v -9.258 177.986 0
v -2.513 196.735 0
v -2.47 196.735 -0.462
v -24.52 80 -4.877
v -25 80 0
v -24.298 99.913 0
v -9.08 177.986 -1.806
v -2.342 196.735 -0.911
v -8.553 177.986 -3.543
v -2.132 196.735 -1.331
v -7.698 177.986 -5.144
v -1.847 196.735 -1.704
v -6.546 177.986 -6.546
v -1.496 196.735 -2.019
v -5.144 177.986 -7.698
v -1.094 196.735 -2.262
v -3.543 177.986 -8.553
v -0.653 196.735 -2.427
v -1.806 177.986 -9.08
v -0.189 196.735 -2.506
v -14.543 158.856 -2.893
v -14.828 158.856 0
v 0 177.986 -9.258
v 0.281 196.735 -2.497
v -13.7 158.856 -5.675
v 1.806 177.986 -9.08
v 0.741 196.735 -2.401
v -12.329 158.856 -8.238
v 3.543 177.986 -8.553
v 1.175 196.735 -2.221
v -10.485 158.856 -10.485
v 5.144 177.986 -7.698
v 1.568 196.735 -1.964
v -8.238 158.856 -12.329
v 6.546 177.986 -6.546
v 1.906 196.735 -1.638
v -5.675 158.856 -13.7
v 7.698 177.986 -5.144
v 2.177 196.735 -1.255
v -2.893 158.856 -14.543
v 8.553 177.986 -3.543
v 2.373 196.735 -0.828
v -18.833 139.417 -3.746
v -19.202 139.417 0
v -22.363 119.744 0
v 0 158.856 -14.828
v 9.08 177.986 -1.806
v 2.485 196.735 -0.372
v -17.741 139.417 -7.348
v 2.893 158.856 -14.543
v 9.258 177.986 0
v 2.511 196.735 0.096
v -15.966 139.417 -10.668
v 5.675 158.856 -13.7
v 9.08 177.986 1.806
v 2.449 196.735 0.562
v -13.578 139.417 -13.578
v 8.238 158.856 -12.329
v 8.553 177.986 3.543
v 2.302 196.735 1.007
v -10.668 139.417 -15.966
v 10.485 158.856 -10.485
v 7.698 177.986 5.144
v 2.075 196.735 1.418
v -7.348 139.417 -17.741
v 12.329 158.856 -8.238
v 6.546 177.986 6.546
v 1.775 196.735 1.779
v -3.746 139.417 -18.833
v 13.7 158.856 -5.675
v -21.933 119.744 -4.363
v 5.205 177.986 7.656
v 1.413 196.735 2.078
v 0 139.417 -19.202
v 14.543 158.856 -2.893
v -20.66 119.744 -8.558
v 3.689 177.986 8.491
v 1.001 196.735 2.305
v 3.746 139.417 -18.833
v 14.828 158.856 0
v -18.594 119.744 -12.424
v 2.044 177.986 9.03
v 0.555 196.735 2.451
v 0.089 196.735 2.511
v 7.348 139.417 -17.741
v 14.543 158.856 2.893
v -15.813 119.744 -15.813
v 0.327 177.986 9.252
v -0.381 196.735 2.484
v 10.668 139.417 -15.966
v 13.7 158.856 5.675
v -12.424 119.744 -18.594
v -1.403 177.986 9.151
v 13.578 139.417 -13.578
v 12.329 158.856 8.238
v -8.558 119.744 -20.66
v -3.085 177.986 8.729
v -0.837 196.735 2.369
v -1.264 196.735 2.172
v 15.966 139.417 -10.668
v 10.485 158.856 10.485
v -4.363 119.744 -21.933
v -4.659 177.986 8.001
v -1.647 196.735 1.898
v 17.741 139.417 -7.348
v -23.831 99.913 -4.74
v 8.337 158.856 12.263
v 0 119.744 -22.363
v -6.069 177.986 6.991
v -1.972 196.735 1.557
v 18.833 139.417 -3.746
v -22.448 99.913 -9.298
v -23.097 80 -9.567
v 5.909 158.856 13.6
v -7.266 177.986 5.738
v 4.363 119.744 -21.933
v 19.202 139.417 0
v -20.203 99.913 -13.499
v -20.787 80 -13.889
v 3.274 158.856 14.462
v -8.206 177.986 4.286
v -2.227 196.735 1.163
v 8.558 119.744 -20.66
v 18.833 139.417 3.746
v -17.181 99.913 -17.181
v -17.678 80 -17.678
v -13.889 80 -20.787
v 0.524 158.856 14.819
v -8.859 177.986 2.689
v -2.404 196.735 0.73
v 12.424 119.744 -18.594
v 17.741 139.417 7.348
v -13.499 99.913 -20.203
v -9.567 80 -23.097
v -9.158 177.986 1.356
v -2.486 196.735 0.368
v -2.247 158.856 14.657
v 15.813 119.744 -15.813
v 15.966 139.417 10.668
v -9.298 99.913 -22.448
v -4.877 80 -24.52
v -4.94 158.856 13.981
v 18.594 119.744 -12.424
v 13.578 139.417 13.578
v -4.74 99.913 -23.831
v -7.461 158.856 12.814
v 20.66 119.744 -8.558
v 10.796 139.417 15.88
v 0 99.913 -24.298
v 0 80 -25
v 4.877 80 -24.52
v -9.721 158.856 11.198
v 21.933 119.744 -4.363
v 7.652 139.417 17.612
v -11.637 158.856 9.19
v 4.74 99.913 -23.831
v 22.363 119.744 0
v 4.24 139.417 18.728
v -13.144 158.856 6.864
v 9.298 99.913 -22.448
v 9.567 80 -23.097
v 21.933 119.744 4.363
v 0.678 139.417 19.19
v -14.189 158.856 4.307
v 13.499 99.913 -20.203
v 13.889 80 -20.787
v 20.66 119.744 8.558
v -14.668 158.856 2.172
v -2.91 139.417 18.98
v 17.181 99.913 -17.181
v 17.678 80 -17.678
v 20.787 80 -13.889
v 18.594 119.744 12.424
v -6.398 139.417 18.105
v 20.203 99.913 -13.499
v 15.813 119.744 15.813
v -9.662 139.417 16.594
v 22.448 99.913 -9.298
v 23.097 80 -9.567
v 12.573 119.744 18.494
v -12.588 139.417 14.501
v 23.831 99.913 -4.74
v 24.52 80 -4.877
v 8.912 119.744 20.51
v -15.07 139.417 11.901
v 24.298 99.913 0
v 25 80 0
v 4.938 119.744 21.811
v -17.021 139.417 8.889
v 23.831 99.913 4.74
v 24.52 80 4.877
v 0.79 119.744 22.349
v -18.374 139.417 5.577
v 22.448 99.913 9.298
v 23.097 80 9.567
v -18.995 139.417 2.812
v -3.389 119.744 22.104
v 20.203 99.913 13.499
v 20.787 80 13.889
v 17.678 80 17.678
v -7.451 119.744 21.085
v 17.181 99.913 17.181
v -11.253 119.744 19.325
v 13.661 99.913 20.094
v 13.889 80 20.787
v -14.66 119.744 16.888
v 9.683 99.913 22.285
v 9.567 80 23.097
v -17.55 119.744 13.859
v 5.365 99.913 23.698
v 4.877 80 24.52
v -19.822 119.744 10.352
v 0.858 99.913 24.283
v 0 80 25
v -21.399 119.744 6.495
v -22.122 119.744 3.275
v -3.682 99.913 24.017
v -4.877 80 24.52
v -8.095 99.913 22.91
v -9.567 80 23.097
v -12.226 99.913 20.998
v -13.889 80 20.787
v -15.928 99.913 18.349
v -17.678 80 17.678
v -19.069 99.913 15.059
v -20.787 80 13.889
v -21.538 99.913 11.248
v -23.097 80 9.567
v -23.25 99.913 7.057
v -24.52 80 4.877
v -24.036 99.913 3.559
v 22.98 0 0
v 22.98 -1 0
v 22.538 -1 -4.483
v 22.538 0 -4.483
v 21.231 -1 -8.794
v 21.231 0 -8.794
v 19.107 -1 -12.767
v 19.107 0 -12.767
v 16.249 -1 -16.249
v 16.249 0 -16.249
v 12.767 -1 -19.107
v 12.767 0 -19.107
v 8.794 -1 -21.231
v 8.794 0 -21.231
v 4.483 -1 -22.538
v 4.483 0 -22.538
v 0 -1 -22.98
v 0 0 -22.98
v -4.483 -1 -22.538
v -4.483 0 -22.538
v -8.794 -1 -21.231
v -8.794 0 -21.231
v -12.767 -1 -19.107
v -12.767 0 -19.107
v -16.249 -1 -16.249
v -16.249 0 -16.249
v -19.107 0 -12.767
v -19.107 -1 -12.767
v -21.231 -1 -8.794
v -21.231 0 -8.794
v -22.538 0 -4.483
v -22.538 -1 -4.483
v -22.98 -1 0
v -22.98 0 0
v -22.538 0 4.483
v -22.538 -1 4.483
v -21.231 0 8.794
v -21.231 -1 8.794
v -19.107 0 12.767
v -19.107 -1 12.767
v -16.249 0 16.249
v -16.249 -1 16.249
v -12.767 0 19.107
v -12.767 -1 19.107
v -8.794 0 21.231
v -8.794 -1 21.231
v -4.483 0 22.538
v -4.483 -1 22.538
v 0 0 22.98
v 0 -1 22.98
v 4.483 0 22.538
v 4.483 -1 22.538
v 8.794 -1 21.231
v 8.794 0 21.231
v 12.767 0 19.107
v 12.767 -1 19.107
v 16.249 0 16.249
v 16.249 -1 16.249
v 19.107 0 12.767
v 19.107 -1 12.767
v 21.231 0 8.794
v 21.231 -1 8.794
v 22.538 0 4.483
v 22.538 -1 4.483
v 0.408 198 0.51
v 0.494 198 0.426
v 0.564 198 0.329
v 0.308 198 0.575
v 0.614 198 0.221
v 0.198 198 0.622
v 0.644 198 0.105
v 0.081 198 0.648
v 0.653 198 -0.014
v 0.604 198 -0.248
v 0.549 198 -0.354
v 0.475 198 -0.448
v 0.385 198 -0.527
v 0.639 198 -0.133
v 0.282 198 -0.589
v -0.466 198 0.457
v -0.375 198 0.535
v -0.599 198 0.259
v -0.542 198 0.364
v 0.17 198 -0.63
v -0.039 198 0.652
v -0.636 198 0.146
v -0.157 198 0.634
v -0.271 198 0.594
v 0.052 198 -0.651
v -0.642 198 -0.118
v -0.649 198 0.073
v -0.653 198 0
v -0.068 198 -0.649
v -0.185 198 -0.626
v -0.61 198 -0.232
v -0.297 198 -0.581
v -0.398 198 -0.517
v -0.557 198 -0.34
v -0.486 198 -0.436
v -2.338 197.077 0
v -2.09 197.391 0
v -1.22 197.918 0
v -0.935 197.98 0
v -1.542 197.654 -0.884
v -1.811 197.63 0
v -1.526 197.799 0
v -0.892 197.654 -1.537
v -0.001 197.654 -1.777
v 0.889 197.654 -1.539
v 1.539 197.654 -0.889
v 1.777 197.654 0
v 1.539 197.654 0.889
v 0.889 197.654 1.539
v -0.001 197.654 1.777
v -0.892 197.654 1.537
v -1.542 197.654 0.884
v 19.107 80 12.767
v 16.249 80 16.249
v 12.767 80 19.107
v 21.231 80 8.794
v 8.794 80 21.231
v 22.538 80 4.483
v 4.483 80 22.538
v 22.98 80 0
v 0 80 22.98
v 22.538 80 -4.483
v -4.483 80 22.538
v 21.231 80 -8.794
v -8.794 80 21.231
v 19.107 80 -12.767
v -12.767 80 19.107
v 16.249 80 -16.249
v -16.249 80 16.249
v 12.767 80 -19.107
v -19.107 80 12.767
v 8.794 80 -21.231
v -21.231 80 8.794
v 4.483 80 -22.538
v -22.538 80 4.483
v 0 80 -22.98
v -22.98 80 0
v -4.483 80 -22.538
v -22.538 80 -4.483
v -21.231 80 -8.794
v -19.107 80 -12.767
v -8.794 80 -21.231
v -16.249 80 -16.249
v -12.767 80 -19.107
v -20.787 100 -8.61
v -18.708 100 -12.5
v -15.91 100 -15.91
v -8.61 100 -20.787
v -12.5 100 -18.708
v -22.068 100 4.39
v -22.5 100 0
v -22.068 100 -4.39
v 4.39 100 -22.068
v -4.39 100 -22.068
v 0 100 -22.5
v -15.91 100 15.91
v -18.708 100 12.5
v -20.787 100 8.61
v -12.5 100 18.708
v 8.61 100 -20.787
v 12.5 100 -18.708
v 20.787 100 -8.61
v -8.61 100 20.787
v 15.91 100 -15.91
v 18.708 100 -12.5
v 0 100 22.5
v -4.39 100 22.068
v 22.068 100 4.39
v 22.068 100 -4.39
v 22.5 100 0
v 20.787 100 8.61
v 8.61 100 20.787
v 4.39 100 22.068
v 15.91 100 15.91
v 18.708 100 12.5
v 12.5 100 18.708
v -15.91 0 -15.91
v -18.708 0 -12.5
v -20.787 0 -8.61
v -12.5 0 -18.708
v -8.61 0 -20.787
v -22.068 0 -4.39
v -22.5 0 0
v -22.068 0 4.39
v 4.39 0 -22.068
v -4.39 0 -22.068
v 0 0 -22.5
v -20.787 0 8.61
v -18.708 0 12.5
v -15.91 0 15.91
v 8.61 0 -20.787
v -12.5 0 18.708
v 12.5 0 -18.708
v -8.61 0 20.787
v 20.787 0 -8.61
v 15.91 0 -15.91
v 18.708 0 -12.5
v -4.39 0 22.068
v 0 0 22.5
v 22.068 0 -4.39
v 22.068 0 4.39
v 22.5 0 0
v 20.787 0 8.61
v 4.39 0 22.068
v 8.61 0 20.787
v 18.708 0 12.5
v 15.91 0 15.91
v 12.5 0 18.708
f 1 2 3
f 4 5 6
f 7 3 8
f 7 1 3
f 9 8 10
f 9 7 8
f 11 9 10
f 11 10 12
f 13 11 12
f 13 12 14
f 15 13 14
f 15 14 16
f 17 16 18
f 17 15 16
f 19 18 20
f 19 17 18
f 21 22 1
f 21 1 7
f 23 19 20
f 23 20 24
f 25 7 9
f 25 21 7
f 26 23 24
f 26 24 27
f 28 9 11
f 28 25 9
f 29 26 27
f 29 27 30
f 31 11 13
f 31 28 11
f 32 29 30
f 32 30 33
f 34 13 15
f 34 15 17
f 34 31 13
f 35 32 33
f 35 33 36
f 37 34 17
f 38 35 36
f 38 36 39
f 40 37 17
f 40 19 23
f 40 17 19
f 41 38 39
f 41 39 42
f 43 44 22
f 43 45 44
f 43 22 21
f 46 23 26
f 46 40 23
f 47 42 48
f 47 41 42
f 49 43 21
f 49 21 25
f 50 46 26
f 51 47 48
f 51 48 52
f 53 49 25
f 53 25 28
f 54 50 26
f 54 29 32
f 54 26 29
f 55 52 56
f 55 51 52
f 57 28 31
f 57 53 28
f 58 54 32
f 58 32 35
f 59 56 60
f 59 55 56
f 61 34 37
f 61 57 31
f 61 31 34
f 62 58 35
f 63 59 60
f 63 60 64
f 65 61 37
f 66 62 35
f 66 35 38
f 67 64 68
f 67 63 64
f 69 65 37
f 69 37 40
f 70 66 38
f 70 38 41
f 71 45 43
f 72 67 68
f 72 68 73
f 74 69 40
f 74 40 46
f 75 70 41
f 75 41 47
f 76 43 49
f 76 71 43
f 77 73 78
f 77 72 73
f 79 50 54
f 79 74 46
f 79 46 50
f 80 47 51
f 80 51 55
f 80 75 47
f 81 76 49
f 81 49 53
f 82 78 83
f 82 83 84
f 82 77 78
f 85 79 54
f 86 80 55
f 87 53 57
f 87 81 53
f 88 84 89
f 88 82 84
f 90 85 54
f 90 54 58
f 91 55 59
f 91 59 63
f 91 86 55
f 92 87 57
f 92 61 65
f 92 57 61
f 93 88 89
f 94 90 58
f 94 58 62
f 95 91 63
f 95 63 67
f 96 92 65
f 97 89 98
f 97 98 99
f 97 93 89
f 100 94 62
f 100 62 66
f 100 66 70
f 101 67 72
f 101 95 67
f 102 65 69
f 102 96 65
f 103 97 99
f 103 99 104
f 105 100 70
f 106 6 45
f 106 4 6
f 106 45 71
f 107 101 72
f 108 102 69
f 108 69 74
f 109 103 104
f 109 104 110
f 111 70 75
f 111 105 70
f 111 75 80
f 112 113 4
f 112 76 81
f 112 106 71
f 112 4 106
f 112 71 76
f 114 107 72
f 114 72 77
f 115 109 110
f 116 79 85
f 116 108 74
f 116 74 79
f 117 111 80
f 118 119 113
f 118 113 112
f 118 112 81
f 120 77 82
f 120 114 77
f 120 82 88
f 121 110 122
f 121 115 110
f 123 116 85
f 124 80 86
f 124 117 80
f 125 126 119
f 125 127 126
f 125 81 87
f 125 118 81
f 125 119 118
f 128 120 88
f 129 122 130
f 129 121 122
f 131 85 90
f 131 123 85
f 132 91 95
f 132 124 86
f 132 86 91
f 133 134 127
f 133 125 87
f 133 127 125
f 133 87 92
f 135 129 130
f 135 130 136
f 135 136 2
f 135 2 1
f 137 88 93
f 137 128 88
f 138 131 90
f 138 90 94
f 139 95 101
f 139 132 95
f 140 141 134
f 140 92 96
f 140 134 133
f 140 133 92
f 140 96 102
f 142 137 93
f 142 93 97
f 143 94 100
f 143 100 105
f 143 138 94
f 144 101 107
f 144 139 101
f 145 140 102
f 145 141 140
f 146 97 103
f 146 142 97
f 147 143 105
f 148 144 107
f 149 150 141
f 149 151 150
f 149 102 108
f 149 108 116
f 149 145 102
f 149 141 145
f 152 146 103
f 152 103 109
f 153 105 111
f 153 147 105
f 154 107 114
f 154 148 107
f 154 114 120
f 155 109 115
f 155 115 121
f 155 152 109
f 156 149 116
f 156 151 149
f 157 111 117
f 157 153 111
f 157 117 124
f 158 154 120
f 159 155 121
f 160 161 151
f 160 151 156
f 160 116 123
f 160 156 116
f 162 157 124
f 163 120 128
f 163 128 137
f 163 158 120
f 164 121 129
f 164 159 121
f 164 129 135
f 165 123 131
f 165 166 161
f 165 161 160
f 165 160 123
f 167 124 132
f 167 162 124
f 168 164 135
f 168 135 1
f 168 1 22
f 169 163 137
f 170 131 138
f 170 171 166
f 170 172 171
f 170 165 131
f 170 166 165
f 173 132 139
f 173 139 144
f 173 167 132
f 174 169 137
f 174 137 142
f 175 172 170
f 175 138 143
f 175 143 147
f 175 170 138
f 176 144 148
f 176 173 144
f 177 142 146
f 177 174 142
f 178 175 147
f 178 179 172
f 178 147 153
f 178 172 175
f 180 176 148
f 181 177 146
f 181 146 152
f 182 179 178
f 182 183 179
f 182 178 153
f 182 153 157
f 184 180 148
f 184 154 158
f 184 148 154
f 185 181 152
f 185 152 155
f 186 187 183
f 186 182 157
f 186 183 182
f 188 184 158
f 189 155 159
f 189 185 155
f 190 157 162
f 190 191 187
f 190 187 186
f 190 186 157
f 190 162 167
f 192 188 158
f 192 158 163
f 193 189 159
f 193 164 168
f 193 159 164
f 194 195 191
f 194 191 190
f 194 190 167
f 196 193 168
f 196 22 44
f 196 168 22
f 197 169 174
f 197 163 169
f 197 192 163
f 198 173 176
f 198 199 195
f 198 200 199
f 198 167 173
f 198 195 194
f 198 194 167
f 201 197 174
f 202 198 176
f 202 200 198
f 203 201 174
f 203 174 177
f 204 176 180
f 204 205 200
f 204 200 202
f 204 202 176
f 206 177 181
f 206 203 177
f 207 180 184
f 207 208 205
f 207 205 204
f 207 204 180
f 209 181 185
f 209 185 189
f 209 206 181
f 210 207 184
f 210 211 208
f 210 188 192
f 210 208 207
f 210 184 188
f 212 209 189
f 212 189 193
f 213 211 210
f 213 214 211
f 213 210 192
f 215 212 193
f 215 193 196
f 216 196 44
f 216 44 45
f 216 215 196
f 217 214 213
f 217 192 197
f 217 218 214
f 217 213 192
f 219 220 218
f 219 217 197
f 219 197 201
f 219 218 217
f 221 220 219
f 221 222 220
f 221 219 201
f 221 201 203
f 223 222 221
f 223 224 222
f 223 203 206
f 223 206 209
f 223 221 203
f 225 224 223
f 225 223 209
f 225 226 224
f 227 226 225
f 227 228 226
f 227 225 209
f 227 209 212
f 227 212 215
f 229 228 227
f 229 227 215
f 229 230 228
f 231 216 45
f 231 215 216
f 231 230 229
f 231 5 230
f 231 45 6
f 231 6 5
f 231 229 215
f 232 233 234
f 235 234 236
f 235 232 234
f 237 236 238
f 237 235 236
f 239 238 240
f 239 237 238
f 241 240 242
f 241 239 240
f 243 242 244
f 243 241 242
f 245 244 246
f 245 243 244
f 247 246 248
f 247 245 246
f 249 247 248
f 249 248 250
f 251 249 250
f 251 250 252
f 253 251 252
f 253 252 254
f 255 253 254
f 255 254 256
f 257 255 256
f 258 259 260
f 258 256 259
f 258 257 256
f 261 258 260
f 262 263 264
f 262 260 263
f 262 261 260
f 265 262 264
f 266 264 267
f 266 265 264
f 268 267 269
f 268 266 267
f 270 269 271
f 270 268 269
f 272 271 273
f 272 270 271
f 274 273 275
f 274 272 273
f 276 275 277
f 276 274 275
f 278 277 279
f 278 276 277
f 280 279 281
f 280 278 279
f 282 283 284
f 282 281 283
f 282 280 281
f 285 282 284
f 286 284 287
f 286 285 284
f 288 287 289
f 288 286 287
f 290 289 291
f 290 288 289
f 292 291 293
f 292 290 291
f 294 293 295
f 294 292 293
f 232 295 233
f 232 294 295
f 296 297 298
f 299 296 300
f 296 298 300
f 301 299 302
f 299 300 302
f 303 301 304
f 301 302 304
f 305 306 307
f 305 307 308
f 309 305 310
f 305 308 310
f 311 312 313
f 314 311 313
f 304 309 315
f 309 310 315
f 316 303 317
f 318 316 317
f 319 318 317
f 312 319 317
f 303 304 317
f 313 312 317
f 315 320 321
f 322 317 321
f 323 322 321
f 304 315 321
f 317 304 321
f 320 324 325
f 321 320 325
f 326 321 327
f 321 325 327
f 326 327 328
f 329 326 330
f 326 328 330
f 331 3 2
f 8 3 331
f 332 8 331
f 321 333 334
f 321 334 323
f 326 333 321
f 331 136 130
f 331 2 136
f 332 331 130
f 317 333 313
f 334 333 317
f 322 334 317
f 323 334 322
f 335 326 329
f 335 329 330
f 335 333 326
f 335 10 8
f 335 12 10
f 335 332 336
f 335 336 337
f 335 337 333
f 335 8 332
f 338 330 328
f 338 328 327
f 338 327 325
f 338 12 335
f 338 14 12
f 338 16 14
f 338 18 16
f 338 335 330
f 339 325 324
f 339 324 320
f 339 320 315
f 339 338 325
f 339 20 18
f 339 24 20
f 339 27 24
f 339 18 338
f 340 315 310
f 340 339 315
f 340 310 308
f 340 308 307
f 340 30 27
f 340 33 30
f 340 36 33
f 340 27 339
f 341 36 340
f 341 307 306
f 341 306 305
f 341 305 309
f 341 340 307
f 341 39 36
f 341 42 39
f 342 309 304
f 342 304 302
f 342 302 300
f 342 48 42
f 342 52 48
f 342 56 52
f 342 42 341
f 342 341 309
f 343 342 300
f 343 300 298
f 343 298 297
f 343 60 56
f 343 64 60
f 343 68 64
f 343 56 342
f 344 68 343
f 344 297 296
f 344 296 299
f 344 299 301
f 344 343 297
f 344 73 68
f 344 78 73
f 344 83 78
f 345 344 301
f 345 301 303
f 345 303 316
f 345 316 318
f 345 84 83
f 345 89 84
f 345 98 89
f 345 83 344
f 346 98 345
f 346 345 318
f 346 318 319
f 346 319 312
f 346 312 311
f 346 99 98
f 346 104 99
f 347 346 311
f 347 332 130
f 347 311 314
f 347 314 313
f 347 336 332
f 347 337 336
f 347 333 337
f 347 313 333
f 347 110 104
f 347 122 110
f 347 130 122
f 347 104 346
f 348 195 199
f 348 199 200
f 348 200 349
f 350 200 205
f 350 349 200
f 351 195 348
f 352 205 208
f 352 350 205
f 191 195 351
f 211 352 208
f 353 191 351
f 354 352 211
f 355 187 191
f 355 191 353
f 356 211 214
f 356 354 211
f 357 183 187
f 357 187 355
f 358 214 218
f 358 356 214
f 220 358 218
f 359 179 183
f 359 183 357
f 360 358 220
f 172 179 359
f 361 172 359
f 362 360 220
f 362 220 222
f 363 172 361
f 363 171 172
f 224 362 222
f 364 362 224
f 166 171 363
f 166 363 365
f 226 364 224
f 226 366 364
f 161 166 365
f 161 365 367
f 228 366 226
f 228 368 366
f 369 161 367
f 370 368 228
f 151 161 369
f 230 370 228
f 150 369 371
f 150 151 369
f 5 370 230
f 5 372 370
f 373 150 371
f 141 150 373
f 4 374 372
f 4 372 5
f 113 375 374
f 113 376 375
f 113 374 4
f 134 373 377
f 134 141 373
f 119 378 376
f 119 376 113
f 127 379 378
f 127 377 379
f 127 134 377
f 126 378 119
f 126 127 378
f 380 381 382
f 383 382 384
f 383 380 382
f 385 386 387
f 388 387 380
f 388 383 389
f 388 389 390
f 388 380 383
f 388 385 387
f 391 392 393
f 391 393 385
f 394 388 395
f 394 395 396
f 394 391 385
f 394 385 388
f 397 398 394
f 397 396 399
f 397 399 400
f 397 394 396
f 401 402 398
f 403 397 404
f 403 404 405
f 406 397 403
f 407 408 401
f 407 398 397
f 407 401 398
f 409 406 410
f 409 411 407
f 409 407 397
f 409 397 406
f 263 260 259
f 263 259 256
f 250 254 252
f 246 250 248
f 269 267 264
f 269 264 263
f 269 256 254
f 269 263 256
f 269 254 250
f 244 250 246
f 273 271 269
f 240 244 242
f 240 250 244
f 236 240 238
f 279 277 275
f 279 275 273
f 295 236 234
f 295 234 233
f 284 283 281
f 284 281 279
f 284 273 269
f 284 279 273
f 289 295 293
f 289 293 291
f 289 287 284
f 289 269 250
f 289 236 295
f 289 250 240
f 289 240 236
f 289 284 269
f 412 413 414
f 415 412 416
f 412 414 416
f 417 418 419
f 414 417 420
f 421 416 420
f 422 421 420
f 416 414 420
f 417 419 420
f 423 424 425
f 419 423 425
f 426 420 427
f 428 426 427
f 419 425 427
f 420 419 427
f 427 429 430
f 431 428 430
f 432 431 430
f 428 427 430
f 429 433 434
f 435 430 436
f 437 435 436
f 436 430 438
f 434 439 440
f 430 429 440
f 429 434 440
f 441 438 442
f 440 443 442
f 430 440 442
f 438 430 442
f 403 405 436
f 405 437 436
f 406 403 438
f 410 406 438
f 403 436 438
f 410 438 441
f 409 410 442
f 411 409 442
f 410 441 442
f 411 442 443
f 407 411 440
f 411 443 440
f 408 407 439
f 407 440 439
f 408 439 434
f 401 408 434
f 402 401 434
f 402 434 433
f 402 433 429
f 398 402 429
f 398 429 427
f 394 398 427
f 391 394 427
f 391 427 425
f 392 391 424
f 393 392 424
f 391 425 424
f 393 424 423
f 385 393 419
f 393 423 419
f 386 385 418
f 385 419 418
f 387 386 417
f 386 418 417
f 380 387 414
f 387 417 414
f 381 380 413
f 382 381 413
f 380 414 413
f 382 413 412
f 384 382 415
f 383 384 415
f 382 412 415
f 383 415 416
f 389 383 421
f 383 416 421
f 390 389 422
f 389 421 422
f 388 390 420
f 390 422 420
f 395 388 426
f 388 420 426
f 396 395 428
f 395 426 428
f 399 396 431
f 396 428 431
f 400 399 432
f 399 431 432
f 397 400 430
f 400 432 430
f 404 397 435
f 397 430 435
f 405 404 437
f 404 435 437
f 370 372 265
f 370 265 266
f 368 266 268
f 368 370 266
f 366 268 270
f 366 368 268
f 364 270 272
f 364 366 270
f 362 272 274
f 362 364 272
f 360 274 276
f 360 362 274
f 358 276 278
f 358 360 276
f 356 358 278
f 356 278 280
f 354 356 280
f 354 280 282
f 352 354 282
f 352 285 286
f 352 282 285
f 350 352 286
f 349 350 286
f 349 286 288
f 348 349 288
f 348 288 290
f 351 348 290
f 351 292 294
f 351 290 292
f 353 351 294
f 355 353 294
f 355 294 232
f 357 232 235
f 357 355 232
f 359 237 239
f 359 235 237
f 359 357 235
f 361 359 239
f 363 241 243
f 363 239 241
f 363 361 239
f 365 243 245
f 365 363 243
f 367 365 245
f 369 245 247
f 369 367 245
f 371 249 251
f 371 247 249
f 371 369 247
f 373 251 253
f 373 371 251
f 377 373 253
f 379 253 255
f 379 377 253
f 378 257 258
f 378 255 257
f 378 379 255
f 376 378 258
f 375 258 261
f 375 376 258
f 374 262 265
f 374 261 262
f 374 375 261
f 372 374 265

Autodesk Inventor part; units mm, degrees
ref_plane "YZ Plane" through (0, 0, 0) normal (1, 0, 0) x (0, 1, 0)
ref_plane "XZ Plane" through (0, 0, 0) normal (0, 1, 0) x (-1, 0, 0)
ref_plane "XY Plane" through (0, 0, 0) normal (0, 0, 1) x (1, 0, 0)
sketch "Szkic1" plane through (0, 0, 0) normal (0, 0, 1) x (1, 0, 0)
  line L0 (0, 0) -> (-22.98, 0)
  line L1 (-2.0098, 198) -> (0, 198)
  line L2 (0, 198) -> (0, 0)
  line L3 (-22.98, 0) -> (-22.98, 80)
  line L4 (-22.98, 80) -> (-25, 80)
  arc A0 (-2.0098, 198) -> (-25, 80) centre (296.3098, 78.6381) ccw
  dimension "d0" = 22.98
  dimension "d10" = 80
  dimension "d11" = 198
  dimension "d13" = 2.02
revolve "Obrót1" add sketch "Szkic1" angle 360 about axis through (0, 198, 0) along (0, -1, 0)
fillet "Zaokrąglenie2" radius 2 1 edges at (2.0098, 198, 0)
sketch "Szkic4" plane through (0, 0, 0) normal (0, -1, 0) x (1, 0, 0)
  circle A0 centre (0, 0) radius 22.98 projected
  circle A1 centre (0, 0) radius 22.98 projected
  circle A2 centre (0, 0) radius 22.5
  point P0 (0, 0)
  dimension "d21" = 0.48
  dimension "d22" = 45
extrude "parachute" cut sketch "Szkic4" against normal blind 100 contours A2
sketch "Sketch9" plane through (0, 0, 0) normal (0, -1, 0) x (1, 0, 0)
  circle A0 centre (0, 0) radius 22.98 projected
  point P0 (0, 0)
extrude "Extrusion4" add sketch "Sketch9" along normal blind 1
properties part number "nose-conev2" material "Papier"
